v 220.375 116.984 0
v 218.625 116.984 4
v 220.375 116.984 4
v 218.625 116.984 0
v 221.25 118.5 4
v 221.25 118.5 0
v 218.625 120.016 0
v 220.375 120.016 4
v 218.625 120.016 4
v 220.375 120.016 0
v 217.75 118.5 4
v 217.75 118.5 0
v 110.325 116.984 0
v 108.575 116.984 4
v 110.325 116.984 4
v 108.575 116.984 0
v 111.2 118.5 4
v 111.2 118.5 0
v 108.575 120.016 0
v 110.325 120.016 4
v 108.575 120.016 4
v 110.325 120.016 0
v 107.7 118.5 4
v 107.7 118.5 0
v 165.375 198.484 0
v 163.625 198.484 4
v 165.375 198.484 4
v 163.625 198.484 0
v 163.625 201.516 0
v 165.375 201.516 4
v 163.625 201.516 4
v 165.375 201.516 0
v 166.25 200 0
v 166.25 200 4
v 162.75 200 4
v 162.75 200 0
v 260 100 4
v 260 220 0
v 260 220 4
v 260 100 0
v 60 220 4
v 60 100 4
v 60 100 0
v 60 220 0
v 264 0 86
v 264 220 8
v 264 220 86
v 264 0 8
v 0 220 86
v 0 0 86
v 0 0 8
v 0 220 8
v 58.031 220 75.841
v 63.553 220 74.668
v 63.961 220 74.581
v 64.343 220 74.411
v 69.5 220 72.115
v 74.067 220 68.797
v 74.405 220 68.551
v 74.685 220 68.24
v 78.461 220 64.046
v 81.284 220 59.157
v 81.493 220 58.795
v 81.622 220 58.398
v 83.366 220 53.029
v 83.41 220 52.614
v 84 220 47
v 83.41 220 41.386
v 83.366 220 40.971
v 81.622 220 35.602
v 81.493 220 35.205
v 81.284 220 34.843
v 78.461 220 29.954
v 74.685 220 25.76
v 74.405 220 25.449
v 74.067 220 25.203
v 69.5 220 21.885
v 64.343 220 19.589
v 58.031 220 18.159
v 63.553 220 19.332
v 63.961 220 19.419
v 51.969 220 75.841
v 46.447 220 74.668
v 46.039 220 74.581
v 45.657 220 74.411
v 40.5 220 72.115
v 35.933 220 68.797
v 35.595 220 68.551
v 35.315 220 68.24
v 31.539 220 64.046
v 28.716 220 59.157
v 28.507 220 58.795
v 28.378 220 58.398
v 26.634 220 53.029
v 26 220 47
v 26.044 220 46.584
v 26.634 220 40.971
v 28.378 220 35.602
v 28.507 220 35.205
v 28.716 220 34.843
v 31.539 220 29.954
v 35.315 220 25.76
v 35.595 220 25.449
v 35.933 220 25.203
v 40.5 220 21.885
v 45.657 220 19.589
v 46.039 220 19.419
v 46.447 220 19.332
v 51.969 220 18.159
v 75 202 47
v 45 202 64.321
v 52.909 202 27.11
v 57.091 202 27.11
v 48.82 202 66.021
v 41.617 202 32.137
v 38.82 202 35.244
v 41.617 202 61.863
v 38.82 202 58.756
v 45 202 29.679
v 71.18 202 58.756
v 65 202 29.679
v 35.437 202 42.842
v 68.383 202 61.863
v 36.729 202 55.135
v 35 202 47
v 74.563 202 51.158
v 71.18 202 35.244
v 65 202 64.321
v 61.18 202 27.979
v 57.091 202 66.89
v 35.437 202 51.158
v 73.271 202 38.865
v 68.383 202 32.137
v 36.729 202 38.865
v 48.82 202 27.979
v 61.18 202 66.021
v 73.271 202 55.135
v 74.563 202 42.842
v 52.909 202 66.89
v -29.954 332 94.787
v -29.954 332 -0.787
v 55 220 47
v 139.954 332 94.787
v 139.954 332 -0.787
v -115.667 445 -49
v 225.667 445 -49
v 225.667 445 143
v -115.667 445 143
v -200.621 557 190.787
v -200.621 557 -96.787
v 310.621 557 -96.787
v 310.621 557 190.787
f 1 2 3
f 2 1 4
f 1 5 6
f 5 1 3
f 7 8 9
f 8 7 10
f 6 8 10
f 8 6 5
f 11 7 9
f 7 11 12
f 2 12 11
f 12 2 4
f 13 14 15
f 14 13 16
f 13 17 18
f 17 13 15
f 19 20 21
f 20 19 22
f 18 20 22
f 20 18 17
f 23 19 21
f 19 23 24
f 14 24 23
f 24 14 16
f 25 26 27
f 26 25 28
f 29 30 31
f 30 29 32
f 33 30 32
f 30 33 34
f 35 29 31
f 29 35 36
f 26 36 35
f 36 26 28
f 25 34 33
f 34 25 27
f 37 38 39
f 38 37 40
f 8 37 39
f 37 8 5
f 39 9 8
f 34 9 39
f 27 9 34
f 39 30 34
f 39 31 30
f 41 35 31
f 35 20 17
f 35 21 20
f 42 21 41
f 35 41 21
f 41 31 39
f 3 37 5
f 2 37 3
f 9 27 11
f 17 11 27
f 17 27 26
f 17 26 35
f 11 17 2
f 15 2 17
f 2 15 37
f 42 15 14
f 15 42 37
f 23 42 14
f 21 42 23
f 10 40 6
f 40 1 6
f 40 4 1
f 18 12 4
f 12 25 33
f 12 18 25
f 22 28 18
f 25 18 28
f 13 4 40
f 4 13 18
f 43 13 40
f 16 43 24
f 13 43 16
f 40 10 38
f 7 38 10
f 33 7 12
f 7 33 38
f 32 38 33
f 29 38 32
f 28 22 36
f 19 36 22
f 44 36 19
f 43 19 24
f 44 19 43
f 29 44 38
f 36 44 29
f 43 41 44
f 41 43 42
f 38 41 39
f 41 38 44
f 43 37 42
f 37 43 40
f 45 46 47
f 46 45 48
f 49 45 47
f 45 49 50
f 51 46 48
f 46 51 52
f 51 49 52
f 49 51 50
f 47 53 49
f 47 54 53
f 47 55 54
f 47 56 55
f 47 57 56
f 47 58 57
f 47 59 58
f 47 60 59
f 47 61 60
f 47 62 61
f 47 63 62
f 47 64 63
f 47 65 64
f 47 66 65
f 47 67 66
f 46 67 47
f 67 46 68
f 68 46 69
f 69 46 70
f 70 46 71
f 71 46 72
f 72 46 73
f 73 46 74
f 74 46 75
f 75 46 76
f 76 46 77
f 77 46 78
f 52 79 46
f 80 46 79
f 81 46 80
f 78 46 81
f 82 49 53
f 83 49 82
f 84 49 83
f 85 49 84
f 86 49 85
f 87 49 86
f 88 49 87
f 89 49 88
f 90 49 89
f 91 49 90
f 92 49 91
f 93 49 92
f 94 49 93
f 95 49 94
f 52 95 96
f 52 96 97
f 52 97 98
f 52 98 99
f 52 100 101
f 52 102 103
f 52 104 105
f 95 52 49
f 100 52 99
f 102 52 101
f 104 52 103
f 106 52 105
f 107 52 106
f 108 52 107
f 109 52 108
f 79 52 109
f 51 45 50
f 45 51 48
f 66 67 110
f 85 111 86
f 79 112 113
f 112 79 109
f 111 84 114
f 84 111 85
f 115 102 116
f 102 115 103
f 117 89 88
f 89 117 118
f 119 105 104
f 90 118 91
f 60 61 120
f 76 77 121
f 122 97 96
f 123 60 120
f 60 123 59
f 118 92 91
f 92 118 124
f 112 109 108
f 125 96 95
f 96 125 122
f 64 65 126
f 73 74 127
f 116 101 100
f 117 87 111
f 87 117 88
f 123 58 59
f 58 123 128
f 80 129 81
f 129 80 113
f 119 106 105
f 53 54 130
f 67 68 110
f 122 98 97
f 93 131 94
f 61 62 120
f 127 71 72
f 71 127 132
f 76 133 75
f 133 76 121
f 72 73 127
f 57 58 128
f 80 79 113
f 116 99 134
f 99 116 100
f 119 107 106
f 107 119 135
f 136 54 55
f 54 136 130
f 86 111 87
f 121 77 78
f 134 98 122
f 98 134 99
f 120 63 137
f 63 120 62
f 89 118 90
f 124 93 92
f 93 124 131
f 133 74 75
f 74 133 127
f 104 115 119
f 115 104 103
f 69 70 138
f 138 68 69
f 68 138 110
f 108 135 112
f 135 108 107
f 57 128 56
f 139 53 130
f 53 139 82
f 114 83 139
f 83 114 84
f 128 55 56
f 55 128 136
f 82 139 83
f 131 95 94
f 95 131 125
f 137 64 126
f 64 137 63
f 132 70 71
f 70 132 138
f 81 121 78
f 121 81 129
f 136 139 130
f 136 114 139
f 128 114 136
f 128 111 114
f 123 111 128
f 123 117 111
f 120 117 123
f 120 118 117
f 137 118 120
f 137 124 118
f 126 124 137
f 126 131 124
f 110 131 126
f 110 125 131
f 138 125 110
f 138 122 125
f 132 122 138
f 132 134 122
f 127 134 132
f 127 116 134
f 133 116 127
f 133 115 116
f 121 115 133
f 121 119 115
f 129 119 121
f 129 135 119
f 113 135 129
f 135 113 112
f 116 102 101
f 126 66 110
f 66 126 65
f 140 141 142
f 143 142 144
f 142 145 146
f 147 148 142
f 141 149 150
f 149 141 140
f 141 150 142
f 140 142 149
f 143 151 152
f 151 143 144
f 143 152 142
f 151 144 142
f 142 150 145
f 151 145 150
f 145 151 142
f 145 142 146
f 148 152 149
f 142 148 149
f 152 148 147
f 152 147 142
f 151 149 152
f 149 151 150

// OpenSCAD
// file: ../scad/bom.scad
module bom(code, desc, category) {
	echo(str(
    "BOM: { \"code\" : \"",
    code,
    "\", \"description\" : \"",
    desc,
    "\", \"categories\" : ",
    category,
    " }"
  ));
}
// file: ../scad/vslot.scad
include <MCAD/units.scad>;
include <MCAD/materials.scad>
use <MCAD/shapes.scad>;
use <bom.scad>;

vslot_color_black = [0.27, 0.27, 0.3];
vslot_color = Aluminum;

module vslot(length=50, sections=1, finish) {
	size = sections * 20;
	bom(str("vslot20x", size, "x", length), str("v-slot 20x", size, " (", length , "mm)"), ["rail", "extrusion", "structure"]);
	cutext = [[12.00,4.50],[10.00,4.50],[8.20,2.78],[8.20,5.50],[6.56,5.50],[3.90,2.84],[3.90,0.21],[3.69,0.00],[3.90,-0.21],[3.90,-2.84],[6.56,-5.50],[8.20,-5.50],[8.20,-2.78],[10.00,-4.50],[12.00,-4.50]];
	cutint = [[16.10,0.21],[16.10,2.84],[12.70,6.24],[12.70,8.78],[7.30,8.78],[7.30,6.24],[3.90,2.84],[3.90,0.21],[3.69,0.00],[3.90,-0.21],[3.90,-2.84],[7.30,-6.24],[7.30,-8.78],[12.70,-8.78],[12.70,-6.24],[16.10,-2.84],[16.10,-0.21],[16.31,0.00],];
	cutcorner = [[8.20,8.20],[6.57,8.20],[6.57,7.66],[7.66,6.57],[8.20,6.57]];

	module profile() {
		difference() {
			translate([0,0,length/2])
			roundedBox(20 * sections, 20, length, 1.5);
			for(i = [0,180]) rotate([0,0,-i]) translate([10 * (sections - 1), 0, -epsilon/2]) {
				linear_extrude(length+20) polygon(cutext);
				translate([5,-2.89,-20]) cube([10,5.78,length+40]);
			}

			for(i = [90,270]) rotate([0,0,-i])
				for(j = [0:sections-1]) translate([0, (sections - 1) * 10 - 20 * j, -epsilon/2]) {
					linear_extrude(length+epsilon) polygon(cutext);
					translate([5,-2.89,-20]) cube([10,5.78,length+40]);
				}

			for(i = [0:sections-1]) translate([i * 20 - 10 * (sections - 1),0,-epsilon/2])
				cylinder(length+20, 2.1, 2.1);

			for(i = [90,270]) rotate([0,0,-i])
				translate([0,(sections - 1) * 10,-epsilon/2])
				linear_extrude(length+epsilon) polygon(cutcorner);
			for(i = [ 0,180]) rotate([0,0,-i])
				translate([(sections - 1) * 10,0,-epsilon/2])
				linear_extrude(length+epsilon) polygon(cutcorner);

			if(sections > 1)
				for(i = [0:sections-2]) translate([(sections - 3) * 10 - i * 20, 0, -epsilon/2])
					linear_extrude(length+epsilon) polygon(cutint);
		}
	}

	if(finish)
		color(finish) profile();
	else
		color(vslot_color) profile();
}

module vslot20x20(length, finish) { vslot(length, 1, finish); }

module vslot20x40(length, finish) { vslot(length, 2, finish); }

module vslot20x60(length, finish) { vslot(length, 3, finish); }

module vslot20x80(length, finish) { vslot(length, 4, finish); }


module vslot_test() {
	$fn = 32;

	vslot20x20(100);

	translate([0, 40, 0])
	vslot20x40(100, vslot_color_black);

	translate([0, 80, 0])
	vslot20x60(100);

	translate([0, 120, 0])
	vslot20x80(100, vslot_color_black);
}
// file: plate.scad
module plate(w,h,d = 3.125, material = "gray") {
  color(material)
    cube([w,h,d]);
}
// file: profile.scad
use <../scad/vslot.scad>

$detailed = false;

module profile(sections, length) {
  if($detailed) {
    rotate([0,0,90])
      vslot(length, sections);
  } else {
    translate([-10,-(20 * sections) / 2,0])
      color("Silver")
        cube([20,sections*20,length]);
  }
}

module profile_20x20(length) {
  profile(1, length);
}

module profile_20x40(length) {
  profile(2, length);
}

module profile_20x60(length) {
  profile(3, length);
}

module profile_20x80(length) {
  profile(4, length);
}
// file: projector.scad
module projector(width, depth, height, Acer_support_height, lensDiameter, lensX, lensY) {
  color("White")
    difference() {
      translate([0, 0, Acer_support_height])
        cube([width, depth, height]);
      rotate([90,0,0])
        translate([lensX, lensY, -depth-2])
          cylinder(20, lensDiameter, lensDiameter / 3 * 2);
    }
}

module pyramid(w, l, h) {
  mw = w/2;
  ml = l/2;
  polyhedron(points = [
    [0,  0,  0],
    [w,  0,  0],
    [0,  l,  0],
    [w,  l,  0],
    [mw, ml, h]
  ], faces = [
    [4, 1, 0],
    [4, 3, 1],
    [4, 2, 3],
    [4, 0, 2],
    //base
    [0, 1, 2],
    [2, 1, 3]
  ]);
}

module projection(center, distToWidth, widthToHeight, dist) {
  w = distToWidth * dist;
  h = widthToHeight * w;
  rotate([0,90,-90])
    translate([-w/2,-h/2,-dist])
      translate(center)
        pyramid(w, h, dist);
}

Acer_support_height = 8; // ~

Acer_size_width  = 264;
Acer_size_depth  = 220;
Acer_size_height =  78;

Acer_lens_diameter = 30; // ~
Acer_lens_x = 55; // ~
Acer_lens_y = Acer_support_height + Acer_size_height / 2; // ~

acer_projector_distances = [112, 225, 337];

module Acer_H6510BD(showProjection=true) {
  projector(Acer_size_width, Acer_size_depth, Acer_size_height, Acer_support_height, Acer_lens_diameter, Acer_lens_x, Acer_lens_y);
  if(showProjection) {
    distToWidth = 192/225;
    widthToHeight = 16/9;
    color([0.75,1,1,0.1]) {
      for(dist = acer_projector_distances)
        projection([-Acer_lens_y,Acer_lens_x,-Acer_size_depth], distToWidth, widthToHeight, dist);
    }

  }
}

module center_projector(pos) {
  if(pos == 1) { // on lens
    translate([-Acer_lens_x,-Acer_size_depth,-Acer_lens_y])
      children();
  } else {
    translate([-Acer_lens_x,-Acer_size_depth,0])
      children();
  }
}

//Acer_H6510BD();
// file: projector_plate.scad
use <plate.scad>;

module Acer_Plate(width, height, offsetX = 0, offsetY = 0, depth = 4) {
  x = 264 - 44.5;
  y = 220 - 20 - 81.5;
  p0 = [0, 0, -depth / 2];
  p1 = [-110.05, 0, -depth / 2];
  p2 = [-55, 81.5, -depth / 2];
  rad = 1.75; // screw is 1.5
  difference() {
    translate([offsetX, offsetY, 0])
      plate(width, height, depth);
    color("black")
    translate([x,y,0]) {
      translate(p0)
        cylinder(depth * 2, rad, rad);
      translate(p1)
        cylinder(depth * 2, rad, rad);
      translate(p2)
        cylinder(depth * 2, rad, rad);
    }
  }
}
// main file
use <projector_plate.scad>;
use <projector.scad>;
include <profile.scad>;

$detailed = false;

translate([0,0,0]) {
  Acer_Plate(200, 120, 60, 100);
  Acer_H6510BD(true);
}

/*
len = 270;
translate([-20,60,-len])
  profile_20x20(len);
translate([-20,140,-len])
  profile_20x20(len);

translate([50, 0, 0])
  profile_20x40(100);

translate([100, 0, 0])
  profile_20x60(100);

translate([150, 0, 0])
  profile_20x80(100);
*/
